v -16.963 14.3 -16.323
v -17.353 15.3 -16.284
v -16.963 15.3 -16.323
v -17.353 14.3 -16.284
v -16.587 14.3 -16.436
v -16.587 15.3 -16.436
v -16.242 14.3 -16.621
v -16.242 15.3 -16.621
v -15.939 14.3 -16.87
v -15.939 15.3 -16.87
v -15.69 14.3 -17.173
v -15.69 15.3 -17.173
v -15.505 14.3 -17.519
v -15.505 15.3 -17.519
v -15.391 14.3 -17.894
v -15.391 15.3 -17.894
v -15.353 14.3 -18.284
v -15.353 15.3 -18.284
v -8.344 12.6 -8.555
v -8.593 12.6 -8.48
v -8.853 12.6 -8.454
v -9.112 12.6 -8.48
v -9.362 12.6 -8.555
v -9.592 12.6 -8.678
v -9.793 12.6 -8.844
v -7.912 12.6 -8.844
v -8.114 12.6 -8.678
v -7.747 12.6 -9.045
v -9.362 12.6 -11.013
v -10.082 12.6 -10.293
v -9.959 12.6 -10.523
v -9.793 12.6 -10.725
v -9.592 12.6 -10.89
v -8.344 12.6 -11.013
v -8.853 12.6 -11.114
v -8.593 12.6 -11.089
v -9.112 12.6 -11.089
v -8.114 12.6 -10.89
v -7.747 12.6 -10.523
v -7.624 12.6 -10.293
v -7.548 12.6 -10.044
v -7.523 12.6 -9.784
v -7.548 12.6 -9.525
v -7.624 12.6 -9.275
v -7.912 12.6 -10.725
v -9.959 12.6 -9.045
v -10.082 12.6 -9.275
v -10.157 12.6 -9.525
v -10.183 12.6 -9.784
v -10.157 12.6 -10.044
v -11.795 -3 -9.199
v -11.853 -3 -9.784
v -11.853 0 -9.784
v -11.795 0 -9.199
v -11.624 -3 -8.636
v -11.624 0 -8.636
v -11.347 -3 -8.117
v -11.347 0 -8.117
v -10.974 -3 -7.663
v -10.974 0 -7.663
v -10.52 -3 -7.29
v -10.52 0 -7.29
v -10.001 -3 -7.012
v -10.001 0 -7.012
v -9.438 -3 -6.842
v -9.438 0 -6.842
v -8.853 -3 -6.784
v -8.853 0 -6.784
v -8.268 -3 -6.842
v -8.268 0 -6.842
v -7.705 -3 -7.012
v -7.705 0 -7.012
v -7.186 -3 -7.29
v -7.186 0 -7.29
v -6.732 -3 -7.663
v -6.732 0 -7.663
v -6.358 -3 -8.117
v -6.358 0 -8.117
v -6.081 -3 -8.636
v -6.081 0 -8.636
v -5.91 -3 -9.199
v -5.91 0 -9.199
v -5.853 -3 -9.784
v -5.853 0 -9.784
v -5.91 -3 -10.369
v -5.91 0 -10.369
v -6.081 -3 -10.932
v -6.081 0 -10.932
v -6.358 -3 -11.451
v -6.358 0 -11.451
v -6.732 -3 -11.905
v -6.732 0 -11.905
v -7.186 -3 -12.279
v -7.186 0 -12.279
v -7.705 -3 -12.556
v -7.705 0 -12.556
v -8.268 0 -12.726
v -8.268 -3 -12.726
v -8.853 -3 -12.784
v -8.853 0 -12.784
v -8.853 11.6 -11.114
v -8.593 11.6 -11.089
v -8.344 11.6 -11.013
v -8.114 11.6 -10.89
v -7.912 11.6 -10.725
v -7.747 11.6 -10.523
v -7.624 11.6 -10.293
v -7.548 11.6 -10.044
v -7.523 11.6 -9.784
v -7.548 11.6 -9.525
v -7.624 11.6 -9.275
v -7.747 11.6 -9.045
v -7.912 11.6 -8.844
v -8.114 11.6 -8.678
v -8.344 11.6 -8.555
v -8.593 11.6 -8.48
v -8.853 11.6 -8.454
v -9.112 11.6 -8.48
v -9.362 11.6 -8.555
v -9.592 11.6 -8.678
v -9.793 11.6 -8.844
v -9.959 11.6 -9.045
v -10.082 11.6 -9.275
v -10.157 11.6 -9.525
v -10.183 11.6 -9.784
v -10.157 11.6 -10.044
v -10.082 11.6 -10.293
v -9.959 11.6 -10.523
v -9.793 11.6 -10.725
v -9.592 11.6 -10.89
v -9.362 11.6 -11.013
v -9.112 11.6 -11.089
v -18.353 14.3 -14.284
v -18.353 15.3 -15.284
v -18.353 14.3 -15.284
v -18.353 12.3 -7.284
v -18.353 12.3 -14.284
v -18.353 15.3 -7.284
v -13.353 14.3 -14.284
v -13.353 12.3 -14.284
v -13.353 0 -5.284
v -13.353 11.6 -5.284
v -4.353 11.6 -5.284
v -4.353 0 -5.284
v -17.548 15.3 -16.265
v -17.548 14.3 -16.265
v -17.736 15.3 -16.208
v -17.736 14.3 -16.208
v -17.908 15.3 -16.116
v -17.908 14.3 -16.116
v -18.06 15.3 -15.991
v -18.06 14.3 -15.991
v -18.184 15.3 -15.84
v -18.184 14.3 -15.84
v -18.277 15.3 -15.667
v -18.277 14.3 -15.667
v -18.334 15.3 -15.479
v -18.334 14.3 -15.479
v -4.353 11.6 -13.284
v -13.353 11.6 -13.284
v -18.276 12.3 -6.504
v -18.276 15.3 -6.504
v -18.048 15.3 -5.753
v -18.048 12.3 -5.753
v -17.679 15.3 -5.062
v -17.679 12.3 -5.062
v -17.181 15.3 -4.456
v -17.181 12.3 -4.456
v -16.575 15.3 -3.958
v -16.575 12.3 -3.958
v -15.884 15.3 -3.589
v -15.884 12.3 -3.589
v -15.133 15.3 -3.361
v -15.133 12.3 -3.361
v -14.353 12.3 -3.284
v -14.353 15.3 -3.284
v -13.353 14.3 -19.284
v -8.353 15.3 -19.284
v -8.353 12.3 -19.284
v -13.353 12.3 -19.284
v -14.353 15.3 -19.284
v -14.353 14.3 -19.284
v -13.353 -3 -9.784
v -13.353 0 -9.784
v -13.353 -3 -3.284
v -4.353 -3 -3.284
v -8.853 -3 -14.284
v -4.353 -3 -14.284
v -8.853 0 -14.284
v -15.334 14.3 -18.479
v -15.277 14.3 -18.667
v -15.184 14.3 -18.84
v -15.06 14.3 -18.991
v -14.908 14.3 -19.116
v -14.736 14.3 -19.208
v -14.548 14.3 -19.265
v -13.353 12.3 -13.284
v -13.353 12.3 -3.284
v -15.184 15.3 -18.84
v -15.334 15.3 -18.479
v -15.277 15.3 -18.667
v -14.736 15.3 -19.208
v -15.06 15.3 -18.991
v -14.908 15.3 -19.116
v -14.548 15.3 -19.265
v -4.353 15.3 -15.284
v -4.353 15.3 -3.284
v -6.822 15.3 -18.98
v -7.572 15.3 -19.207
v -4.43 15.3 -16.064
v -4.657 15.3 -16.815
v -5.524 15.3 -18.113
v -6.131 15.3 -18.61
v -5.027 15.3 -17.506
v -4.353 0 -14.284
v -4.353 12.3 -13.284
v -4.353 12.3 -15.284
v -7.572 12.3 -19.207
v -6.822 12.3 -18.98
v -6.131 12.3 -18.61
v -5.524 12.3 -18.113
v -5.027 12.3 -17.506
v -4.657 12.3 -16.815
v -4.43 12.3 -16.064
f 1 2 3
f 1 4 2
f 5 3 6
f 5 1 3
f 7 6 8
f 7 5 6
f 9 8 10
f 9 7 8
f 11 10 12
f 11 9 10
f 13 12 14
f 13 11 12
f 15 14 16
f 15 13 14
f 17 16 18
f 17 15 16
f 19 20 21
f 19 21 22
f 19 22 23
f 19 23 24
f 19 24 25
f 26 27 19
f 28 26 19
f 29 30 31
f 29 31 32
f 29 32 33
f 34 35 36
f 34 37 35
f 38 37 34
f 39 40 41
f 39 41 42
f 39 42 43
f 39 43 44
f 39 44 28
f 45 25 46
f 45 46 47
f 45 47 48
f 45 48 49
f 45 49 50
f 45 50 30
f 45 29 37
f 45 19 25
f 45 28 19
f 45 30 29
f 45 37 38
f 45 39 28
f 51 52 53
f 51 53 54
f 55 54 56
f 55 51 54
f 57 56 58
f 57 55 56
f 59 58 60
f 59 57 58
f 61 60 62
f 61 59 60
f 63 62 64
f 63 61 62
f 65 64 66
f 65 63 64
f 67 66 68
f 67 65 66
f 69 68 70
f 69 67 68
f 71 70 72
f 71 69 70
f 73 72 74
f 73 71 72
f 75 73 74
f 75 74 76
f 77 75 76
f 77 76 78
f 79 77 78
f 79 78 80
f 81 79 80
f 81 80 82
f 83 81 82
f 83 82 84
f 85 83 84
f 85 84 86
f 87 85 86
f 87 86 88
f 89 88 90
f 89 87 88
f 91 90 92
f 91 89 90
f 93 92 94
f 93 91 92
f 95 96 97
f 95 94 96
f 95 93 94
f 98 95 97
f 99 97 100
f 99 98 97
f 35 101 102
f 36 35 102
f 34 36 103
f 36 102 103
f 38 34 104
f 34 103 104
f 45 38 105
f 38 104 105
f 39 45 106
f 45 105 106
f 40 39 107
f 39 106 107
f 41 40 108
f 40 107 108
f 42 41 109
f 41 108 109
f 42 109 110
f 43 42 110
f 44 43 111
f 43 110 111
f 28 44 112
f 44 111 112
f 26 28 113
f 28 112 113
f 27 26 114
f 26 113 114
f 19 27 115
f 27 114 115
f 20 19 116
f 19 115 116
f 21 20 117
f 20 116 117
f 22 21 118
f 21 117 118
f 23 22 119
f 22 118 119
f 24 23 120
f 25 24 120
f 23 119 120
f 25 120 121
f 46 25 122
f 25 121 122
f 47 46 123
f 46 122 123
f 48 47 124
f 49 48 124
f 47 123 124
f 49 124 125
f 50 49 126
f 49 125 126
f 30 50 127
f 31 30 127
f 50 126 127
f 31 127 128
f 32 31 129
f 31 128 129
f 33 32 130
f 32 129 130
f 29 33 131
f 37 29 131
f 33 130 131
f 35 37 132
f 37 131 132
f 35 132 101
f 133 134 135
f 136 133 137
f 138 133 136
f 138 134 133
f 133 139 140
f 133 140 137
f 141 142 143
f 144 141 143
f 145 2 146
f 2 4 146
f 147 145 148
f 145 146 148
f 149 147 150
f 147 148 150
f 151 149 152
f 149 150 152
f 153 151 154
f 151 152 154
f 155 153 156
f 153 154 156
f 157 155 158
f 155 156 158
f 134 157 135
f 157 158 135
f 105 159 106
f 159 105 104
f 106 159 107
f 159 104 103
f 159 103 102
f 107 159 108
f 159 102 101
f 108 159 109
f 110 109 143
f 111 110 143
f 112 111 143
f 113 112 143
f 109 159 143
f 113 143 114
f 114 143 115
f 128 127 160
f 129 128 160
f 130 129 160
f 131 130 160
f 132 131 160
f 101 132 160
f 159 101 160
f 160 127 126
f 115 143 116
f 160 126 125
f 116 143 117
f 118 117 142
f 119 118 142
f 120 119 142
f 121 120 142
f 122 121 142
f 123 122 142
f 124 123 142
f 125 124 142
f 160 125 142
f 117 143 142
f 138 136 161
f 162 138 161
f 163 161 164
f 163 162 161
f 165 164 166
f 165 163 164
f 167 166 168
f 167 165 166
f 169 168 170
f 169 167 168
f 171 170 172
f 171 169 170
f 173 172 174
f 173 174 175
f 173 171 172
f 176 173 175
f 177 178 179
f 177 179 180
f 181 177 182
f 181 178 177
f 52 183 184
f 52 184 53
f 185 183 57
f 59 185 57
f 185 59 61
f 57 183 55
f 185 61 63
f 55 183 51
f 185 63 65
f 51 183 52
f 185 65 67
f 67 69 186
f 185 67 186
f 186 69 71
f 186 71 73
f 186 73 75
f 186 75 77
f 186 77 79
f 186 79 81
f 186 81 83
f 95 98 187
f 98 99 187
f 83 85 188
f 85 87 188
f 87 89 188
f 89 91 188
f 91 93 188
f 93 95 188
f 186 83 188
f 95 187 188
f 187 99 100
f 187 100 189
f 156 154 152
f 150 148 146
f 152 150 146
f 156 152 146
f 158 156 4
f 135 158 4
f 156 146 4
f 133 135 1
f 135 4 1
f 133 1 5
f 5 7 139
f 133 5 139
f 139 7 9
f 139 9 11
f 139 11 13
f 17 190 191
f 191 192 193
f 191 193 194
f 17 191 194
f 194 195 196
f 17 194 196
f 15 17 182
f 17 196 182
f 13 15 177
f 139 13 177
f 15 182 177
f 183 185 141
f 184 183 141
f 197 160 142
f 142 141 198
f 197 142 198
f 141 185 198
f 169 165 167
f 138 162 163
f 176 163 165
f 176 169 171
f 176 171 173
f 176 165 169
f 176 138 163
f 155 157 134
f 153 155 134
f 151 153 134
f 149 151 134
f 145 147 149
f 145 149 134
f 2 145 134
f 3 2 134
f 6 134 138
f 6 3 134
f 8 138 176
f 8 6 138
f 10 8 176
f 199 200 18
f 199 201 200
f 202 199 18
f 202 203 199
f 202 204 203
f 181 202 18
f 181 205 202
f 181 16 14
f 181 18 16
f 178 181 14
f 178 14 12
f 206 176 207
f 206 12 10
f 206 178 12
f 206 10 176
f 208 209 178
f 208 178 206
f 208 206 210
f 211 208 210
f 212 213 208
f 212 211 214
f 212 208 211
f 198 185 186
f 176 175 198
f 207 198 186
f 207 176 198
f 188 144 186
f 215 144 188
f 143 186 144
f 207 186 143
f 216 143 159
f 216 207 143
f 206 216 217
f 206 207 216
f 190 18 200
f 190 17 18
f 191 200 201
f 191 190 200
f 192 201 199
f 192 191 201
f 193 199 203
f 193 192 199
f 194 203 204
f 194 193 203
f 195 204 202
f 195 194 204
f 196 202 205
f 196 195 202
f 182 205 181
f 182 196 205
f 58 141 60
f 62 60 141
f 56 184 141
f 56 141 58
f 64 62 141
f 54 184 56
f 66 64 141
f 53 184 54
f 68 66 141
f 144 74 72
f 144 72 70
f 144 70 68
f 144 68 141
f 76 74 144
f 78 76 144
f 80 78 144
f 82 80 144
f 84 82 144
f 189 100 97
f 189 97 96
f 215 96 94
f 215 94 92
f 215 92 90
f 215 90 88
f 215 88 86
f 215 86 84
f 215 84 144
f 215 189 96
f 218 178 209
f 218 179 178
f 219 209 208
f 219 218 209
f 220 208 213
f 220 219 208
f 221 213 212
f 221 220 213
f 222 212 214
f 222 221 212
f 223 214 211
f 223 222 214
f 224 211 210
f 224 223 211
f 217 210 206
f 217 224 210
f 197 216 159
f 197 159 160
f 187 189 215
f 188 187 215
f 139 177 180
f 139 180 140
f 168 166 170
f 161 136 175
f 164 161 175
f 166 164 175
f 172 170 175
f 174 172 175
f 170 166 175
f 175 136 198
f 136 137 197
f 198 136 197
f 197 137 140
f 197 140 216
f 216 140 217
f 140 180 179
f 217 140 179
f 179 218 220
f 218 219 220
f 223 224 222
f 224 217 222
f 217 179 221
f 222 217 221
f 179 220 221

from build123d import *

# Parameters (mm, degrees)
ESQUISSE1_W             = 9
ESQUISSE1_H             = 9
BOSS_EXTRU_1_DEPTH      = 3
ENL_V_MAT_EXTRU_1_DEPTH = 20.782165931
ESQUISSE3_W             = 9
ESQUISSE3_H             = 18.3
BOSS_EXTRU_3_DEPTH      = 2
ESQUISSE4_W             = 9
ESQUISSE4_H             = 3.7
BOSS_EXTRU_4_DEPTH      = 8
BOSS_EXTRU_6_DEPTH      = 3
BOSS_EXTRU_8_DEPTH      = 1
CONG_2_R                = 4
CONG_3_R                = 2
ESQUISSE7_R             = 1.329968568
ENL_V_MAT_EXTRU_2_DEPTH = 1
CONG_4_R                = 1


with BuildPart() as part:
    # Esquisse1 → Boss.-Extru.1 (new body)
    with BuildSketch(Plane(origin=(0, 0, 0), x_dir=(1, 0, 0), z_dir=(0, 1, 0))):
        with Locations((-8.852843945, 9.784104714)):
            Rectangle(ESQUISSE1_W, ESQUISSE1_H)
    extrude(amount=-BOSS_EXTRU_1_DEPTH)

    # Esquisse2 → Enlèv. mat.-Extru.1 (cut, through all)
    with BuildSketch(Plane.XZ.offset(3)):
        with BuildLine():
            Line((-8.852843945, -12.784104714), (-8.852843945, -14.284104714))
            Line((-8.852843945, -14.284104714), (-13.352843945, -14.284104714))
            Line((-13.352843945, -14.284104714), (-13.352843945, -9.784104714))
            Line((-13.352843945, -9.784104714), (-11.852843945, -9.784104714))
            ThreePointArc((-11.852843945, -9.784104714), (-6.731523602, -7.66278437), (-8.852843945, -12.784104714))
        make_face()
    extrude(amount=-ENL_V_MAT_EXTRU_1_DEPTH, mode=Mode.SUBTRACT)

    # Esquisse3 → Boss.-Extru.3 (add)
    with BuildSketch(Plane.XY.offset(-5.284104714)):
        with Locations((-8.852843945, 6.15)):
            Rectangle(ESQUISSE3_W, ESQUISSE3_H)
    extrude(amount=BOSS_EXTRU_3_DEPTH)

    # Esquisse4 → Boss.-Extru.4 (add)
    with BuildSketch(Plane(origin=(0, 0, -5.284104714), x_dir=(-1, 0, 0), z_dir=(0, 0, -1))):
        with Locations((8.852843945, 13.45)):
            Rectangle(ESQUISSE4_W, ESQUISSE4_H)
    extrude(amount=BOSS_EXTRU_4_DEPTH)

    # Esquisse8 → Boss.-Extru.6 (add)
    with BuildSketch(Plane(origin=(0, 15.3, 0), x_dir=(1, 0, 0), z_dir=(0, 1, 0))):
        Polygon((-18.352843945, 3.284104714), (-4.352843945, 3.284104714), (-4.352843945, 19.284104714), (-13.352843945, 19.284104714), (-13.352843945, 14.284104714), (-18.352843945, 14.284104714), align=None)
    extrude(amount=-BOSS_EXTRU_6_DEPTH)

    # Esquisse9 → Boss.-Extru.8 (add)
    with BuildSketch(Plane(origin=(0, 15.3, 0), x_dir=(1, 0, 0), z_dir=(0, 1, 0))):
        Polygon((-18.352843945, 16.284104714), (-18.352843945, 3.284104714), (-4.352843945, 3.284104714), (-4.352843945, 19.284104714), (-15.352843945, 19.284104714), (-15.352843945, 16.284104714), align=None)
    extrude(amount=-BOSS_EXTRU_8_DEPTH)

    # Congé2
    cong_2_edges = [part.edges().sort_by_distance(p)[0] for p in [
        (-18.352843945, 13.8, -3.284104714),
        (-4.352843945, 13.8, -19.284104714),
    ]]
    fillet(cong_2_edges, radius=CONG_2_R)

    # Congé3
    cong_3_edges = [part.edges().sort_by_distance(p)[0] for p in [
        (-15.352843945, 14.8, -16.284104714),
    ]]
    fillet(cong_3_edges, radius=CONG_3_R)

    # Esquisse7 → Enlèv. mat.-Extru.2 (cut)
    with BuildSketch(Plane.XZ.offset(-11.6)):
        with Locations(Location((-8.852843945, -9.784104714, 0), (0, 0, 270))):
            Circle(ESQUISSE7_R)
    extrude(amount=-ENL_V_MAT_EXTRU_2_DEPTH, mode=Mode.SUBTRACT)

    # Congé4
    cong_4_edges = [part.edges().sort_by_distance(p)[0] for p in [
        (-15.352843945, 14.8, -19.284104714),
        (-18.352843945, 14.8, -16.284104714),
    ]]
    fillet(cong_4_edges, radius=CONG_4_R - 0.0001)  # a hair under: the kernel refuses the full size


solid = part.part
